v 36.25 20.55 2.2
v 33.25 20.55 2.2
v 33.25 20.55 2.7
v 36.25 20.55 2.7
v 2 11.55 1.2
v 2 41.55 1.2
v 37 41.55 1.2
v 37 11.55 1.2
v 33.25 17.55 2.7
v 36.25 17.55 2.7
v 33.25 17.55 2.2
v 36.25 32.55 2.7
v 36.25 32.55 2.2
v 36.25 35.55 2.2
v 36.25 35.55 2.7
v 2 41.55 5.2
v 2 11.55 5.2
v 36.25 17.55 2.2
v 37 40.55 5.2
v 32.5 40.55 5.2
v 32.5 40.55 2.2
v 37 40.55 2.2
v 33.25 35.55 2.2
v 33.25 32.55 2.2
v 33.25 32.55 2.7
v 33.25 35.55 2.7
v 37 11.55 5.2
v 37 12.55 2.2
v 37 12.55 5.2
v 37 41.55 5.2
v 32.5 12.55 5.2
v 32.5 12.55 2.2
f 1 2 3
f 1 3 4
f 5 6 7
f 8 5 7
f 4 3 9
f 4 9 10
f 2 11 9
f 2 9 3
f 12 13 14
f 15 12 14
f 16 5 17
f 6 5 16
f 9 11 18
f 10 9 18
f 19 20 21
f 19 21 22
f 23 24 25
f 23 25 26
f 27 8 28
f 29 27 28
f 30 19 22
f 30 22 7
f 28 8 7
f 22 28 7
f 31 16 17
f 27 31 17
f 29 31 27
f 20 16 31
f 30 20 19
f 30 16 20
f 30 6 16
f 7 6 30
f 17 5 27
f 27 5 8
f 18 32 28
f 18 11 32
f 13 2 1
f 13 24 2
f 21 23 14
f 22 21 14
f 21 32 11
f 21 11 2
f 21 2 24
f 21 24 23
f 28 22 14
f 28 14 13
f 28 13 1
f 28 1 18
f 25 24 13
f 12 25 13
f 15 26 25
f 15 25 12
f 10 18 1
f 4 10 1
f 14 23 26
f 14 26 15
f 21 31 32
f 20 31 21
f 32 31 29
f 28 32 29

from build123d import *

# Parameters (mm, degrees)
SKETCH034_W     = 35
SKETCH034_H     = 30
PAD022_DEPTH    = 4
SKETCH035_W     = 4.5
SKETCH035_H     = 28
POCKET009_DEPTH = 3
SKETCH036_W     = 3
SKETCH036_H     = 3
PAD023_DEPTH    = 0.5


with BuildPart() as part:
    # Sketch034 (on Face1 of CopyPad014001) → Pad022 (new body)
    with BuildSketch(Plane.XY.offset(1.2)):
        with Locations((19.5, 26.55)):
            Rectangle(SKETCH034_W, SKETCH034_H)
    extrude(amount=PAD022_DEPTH)

    # Sketch035 (on Face6 of Pad022) → Pocket009 (cut)
    with BuildSketch(Plane.XY.offset(5.2)):
        with Locations((34.75, 26.55)):
            Rectangle(SKETCH035_W, SKETCH035_H)
    extrude(amount=-POCKET009_DEPTH, mode=Mode.SUBTRACT)

    # Sketch036 (on Face8 of Pocket009) → Pad023 (join)
    with BuildSketch(Plane.XY.offset(2.2)):
        with Locations((34.75, 34.05)):
            Rectangle(SKETCH036_W, SKETCH036_H)
        with Locations((34.75, 19.05)):
            Rectangle(SKETCH036_W, SKETCH036_H)
    extrude(amount=PAD023_DEPTH)


solid = part.part
